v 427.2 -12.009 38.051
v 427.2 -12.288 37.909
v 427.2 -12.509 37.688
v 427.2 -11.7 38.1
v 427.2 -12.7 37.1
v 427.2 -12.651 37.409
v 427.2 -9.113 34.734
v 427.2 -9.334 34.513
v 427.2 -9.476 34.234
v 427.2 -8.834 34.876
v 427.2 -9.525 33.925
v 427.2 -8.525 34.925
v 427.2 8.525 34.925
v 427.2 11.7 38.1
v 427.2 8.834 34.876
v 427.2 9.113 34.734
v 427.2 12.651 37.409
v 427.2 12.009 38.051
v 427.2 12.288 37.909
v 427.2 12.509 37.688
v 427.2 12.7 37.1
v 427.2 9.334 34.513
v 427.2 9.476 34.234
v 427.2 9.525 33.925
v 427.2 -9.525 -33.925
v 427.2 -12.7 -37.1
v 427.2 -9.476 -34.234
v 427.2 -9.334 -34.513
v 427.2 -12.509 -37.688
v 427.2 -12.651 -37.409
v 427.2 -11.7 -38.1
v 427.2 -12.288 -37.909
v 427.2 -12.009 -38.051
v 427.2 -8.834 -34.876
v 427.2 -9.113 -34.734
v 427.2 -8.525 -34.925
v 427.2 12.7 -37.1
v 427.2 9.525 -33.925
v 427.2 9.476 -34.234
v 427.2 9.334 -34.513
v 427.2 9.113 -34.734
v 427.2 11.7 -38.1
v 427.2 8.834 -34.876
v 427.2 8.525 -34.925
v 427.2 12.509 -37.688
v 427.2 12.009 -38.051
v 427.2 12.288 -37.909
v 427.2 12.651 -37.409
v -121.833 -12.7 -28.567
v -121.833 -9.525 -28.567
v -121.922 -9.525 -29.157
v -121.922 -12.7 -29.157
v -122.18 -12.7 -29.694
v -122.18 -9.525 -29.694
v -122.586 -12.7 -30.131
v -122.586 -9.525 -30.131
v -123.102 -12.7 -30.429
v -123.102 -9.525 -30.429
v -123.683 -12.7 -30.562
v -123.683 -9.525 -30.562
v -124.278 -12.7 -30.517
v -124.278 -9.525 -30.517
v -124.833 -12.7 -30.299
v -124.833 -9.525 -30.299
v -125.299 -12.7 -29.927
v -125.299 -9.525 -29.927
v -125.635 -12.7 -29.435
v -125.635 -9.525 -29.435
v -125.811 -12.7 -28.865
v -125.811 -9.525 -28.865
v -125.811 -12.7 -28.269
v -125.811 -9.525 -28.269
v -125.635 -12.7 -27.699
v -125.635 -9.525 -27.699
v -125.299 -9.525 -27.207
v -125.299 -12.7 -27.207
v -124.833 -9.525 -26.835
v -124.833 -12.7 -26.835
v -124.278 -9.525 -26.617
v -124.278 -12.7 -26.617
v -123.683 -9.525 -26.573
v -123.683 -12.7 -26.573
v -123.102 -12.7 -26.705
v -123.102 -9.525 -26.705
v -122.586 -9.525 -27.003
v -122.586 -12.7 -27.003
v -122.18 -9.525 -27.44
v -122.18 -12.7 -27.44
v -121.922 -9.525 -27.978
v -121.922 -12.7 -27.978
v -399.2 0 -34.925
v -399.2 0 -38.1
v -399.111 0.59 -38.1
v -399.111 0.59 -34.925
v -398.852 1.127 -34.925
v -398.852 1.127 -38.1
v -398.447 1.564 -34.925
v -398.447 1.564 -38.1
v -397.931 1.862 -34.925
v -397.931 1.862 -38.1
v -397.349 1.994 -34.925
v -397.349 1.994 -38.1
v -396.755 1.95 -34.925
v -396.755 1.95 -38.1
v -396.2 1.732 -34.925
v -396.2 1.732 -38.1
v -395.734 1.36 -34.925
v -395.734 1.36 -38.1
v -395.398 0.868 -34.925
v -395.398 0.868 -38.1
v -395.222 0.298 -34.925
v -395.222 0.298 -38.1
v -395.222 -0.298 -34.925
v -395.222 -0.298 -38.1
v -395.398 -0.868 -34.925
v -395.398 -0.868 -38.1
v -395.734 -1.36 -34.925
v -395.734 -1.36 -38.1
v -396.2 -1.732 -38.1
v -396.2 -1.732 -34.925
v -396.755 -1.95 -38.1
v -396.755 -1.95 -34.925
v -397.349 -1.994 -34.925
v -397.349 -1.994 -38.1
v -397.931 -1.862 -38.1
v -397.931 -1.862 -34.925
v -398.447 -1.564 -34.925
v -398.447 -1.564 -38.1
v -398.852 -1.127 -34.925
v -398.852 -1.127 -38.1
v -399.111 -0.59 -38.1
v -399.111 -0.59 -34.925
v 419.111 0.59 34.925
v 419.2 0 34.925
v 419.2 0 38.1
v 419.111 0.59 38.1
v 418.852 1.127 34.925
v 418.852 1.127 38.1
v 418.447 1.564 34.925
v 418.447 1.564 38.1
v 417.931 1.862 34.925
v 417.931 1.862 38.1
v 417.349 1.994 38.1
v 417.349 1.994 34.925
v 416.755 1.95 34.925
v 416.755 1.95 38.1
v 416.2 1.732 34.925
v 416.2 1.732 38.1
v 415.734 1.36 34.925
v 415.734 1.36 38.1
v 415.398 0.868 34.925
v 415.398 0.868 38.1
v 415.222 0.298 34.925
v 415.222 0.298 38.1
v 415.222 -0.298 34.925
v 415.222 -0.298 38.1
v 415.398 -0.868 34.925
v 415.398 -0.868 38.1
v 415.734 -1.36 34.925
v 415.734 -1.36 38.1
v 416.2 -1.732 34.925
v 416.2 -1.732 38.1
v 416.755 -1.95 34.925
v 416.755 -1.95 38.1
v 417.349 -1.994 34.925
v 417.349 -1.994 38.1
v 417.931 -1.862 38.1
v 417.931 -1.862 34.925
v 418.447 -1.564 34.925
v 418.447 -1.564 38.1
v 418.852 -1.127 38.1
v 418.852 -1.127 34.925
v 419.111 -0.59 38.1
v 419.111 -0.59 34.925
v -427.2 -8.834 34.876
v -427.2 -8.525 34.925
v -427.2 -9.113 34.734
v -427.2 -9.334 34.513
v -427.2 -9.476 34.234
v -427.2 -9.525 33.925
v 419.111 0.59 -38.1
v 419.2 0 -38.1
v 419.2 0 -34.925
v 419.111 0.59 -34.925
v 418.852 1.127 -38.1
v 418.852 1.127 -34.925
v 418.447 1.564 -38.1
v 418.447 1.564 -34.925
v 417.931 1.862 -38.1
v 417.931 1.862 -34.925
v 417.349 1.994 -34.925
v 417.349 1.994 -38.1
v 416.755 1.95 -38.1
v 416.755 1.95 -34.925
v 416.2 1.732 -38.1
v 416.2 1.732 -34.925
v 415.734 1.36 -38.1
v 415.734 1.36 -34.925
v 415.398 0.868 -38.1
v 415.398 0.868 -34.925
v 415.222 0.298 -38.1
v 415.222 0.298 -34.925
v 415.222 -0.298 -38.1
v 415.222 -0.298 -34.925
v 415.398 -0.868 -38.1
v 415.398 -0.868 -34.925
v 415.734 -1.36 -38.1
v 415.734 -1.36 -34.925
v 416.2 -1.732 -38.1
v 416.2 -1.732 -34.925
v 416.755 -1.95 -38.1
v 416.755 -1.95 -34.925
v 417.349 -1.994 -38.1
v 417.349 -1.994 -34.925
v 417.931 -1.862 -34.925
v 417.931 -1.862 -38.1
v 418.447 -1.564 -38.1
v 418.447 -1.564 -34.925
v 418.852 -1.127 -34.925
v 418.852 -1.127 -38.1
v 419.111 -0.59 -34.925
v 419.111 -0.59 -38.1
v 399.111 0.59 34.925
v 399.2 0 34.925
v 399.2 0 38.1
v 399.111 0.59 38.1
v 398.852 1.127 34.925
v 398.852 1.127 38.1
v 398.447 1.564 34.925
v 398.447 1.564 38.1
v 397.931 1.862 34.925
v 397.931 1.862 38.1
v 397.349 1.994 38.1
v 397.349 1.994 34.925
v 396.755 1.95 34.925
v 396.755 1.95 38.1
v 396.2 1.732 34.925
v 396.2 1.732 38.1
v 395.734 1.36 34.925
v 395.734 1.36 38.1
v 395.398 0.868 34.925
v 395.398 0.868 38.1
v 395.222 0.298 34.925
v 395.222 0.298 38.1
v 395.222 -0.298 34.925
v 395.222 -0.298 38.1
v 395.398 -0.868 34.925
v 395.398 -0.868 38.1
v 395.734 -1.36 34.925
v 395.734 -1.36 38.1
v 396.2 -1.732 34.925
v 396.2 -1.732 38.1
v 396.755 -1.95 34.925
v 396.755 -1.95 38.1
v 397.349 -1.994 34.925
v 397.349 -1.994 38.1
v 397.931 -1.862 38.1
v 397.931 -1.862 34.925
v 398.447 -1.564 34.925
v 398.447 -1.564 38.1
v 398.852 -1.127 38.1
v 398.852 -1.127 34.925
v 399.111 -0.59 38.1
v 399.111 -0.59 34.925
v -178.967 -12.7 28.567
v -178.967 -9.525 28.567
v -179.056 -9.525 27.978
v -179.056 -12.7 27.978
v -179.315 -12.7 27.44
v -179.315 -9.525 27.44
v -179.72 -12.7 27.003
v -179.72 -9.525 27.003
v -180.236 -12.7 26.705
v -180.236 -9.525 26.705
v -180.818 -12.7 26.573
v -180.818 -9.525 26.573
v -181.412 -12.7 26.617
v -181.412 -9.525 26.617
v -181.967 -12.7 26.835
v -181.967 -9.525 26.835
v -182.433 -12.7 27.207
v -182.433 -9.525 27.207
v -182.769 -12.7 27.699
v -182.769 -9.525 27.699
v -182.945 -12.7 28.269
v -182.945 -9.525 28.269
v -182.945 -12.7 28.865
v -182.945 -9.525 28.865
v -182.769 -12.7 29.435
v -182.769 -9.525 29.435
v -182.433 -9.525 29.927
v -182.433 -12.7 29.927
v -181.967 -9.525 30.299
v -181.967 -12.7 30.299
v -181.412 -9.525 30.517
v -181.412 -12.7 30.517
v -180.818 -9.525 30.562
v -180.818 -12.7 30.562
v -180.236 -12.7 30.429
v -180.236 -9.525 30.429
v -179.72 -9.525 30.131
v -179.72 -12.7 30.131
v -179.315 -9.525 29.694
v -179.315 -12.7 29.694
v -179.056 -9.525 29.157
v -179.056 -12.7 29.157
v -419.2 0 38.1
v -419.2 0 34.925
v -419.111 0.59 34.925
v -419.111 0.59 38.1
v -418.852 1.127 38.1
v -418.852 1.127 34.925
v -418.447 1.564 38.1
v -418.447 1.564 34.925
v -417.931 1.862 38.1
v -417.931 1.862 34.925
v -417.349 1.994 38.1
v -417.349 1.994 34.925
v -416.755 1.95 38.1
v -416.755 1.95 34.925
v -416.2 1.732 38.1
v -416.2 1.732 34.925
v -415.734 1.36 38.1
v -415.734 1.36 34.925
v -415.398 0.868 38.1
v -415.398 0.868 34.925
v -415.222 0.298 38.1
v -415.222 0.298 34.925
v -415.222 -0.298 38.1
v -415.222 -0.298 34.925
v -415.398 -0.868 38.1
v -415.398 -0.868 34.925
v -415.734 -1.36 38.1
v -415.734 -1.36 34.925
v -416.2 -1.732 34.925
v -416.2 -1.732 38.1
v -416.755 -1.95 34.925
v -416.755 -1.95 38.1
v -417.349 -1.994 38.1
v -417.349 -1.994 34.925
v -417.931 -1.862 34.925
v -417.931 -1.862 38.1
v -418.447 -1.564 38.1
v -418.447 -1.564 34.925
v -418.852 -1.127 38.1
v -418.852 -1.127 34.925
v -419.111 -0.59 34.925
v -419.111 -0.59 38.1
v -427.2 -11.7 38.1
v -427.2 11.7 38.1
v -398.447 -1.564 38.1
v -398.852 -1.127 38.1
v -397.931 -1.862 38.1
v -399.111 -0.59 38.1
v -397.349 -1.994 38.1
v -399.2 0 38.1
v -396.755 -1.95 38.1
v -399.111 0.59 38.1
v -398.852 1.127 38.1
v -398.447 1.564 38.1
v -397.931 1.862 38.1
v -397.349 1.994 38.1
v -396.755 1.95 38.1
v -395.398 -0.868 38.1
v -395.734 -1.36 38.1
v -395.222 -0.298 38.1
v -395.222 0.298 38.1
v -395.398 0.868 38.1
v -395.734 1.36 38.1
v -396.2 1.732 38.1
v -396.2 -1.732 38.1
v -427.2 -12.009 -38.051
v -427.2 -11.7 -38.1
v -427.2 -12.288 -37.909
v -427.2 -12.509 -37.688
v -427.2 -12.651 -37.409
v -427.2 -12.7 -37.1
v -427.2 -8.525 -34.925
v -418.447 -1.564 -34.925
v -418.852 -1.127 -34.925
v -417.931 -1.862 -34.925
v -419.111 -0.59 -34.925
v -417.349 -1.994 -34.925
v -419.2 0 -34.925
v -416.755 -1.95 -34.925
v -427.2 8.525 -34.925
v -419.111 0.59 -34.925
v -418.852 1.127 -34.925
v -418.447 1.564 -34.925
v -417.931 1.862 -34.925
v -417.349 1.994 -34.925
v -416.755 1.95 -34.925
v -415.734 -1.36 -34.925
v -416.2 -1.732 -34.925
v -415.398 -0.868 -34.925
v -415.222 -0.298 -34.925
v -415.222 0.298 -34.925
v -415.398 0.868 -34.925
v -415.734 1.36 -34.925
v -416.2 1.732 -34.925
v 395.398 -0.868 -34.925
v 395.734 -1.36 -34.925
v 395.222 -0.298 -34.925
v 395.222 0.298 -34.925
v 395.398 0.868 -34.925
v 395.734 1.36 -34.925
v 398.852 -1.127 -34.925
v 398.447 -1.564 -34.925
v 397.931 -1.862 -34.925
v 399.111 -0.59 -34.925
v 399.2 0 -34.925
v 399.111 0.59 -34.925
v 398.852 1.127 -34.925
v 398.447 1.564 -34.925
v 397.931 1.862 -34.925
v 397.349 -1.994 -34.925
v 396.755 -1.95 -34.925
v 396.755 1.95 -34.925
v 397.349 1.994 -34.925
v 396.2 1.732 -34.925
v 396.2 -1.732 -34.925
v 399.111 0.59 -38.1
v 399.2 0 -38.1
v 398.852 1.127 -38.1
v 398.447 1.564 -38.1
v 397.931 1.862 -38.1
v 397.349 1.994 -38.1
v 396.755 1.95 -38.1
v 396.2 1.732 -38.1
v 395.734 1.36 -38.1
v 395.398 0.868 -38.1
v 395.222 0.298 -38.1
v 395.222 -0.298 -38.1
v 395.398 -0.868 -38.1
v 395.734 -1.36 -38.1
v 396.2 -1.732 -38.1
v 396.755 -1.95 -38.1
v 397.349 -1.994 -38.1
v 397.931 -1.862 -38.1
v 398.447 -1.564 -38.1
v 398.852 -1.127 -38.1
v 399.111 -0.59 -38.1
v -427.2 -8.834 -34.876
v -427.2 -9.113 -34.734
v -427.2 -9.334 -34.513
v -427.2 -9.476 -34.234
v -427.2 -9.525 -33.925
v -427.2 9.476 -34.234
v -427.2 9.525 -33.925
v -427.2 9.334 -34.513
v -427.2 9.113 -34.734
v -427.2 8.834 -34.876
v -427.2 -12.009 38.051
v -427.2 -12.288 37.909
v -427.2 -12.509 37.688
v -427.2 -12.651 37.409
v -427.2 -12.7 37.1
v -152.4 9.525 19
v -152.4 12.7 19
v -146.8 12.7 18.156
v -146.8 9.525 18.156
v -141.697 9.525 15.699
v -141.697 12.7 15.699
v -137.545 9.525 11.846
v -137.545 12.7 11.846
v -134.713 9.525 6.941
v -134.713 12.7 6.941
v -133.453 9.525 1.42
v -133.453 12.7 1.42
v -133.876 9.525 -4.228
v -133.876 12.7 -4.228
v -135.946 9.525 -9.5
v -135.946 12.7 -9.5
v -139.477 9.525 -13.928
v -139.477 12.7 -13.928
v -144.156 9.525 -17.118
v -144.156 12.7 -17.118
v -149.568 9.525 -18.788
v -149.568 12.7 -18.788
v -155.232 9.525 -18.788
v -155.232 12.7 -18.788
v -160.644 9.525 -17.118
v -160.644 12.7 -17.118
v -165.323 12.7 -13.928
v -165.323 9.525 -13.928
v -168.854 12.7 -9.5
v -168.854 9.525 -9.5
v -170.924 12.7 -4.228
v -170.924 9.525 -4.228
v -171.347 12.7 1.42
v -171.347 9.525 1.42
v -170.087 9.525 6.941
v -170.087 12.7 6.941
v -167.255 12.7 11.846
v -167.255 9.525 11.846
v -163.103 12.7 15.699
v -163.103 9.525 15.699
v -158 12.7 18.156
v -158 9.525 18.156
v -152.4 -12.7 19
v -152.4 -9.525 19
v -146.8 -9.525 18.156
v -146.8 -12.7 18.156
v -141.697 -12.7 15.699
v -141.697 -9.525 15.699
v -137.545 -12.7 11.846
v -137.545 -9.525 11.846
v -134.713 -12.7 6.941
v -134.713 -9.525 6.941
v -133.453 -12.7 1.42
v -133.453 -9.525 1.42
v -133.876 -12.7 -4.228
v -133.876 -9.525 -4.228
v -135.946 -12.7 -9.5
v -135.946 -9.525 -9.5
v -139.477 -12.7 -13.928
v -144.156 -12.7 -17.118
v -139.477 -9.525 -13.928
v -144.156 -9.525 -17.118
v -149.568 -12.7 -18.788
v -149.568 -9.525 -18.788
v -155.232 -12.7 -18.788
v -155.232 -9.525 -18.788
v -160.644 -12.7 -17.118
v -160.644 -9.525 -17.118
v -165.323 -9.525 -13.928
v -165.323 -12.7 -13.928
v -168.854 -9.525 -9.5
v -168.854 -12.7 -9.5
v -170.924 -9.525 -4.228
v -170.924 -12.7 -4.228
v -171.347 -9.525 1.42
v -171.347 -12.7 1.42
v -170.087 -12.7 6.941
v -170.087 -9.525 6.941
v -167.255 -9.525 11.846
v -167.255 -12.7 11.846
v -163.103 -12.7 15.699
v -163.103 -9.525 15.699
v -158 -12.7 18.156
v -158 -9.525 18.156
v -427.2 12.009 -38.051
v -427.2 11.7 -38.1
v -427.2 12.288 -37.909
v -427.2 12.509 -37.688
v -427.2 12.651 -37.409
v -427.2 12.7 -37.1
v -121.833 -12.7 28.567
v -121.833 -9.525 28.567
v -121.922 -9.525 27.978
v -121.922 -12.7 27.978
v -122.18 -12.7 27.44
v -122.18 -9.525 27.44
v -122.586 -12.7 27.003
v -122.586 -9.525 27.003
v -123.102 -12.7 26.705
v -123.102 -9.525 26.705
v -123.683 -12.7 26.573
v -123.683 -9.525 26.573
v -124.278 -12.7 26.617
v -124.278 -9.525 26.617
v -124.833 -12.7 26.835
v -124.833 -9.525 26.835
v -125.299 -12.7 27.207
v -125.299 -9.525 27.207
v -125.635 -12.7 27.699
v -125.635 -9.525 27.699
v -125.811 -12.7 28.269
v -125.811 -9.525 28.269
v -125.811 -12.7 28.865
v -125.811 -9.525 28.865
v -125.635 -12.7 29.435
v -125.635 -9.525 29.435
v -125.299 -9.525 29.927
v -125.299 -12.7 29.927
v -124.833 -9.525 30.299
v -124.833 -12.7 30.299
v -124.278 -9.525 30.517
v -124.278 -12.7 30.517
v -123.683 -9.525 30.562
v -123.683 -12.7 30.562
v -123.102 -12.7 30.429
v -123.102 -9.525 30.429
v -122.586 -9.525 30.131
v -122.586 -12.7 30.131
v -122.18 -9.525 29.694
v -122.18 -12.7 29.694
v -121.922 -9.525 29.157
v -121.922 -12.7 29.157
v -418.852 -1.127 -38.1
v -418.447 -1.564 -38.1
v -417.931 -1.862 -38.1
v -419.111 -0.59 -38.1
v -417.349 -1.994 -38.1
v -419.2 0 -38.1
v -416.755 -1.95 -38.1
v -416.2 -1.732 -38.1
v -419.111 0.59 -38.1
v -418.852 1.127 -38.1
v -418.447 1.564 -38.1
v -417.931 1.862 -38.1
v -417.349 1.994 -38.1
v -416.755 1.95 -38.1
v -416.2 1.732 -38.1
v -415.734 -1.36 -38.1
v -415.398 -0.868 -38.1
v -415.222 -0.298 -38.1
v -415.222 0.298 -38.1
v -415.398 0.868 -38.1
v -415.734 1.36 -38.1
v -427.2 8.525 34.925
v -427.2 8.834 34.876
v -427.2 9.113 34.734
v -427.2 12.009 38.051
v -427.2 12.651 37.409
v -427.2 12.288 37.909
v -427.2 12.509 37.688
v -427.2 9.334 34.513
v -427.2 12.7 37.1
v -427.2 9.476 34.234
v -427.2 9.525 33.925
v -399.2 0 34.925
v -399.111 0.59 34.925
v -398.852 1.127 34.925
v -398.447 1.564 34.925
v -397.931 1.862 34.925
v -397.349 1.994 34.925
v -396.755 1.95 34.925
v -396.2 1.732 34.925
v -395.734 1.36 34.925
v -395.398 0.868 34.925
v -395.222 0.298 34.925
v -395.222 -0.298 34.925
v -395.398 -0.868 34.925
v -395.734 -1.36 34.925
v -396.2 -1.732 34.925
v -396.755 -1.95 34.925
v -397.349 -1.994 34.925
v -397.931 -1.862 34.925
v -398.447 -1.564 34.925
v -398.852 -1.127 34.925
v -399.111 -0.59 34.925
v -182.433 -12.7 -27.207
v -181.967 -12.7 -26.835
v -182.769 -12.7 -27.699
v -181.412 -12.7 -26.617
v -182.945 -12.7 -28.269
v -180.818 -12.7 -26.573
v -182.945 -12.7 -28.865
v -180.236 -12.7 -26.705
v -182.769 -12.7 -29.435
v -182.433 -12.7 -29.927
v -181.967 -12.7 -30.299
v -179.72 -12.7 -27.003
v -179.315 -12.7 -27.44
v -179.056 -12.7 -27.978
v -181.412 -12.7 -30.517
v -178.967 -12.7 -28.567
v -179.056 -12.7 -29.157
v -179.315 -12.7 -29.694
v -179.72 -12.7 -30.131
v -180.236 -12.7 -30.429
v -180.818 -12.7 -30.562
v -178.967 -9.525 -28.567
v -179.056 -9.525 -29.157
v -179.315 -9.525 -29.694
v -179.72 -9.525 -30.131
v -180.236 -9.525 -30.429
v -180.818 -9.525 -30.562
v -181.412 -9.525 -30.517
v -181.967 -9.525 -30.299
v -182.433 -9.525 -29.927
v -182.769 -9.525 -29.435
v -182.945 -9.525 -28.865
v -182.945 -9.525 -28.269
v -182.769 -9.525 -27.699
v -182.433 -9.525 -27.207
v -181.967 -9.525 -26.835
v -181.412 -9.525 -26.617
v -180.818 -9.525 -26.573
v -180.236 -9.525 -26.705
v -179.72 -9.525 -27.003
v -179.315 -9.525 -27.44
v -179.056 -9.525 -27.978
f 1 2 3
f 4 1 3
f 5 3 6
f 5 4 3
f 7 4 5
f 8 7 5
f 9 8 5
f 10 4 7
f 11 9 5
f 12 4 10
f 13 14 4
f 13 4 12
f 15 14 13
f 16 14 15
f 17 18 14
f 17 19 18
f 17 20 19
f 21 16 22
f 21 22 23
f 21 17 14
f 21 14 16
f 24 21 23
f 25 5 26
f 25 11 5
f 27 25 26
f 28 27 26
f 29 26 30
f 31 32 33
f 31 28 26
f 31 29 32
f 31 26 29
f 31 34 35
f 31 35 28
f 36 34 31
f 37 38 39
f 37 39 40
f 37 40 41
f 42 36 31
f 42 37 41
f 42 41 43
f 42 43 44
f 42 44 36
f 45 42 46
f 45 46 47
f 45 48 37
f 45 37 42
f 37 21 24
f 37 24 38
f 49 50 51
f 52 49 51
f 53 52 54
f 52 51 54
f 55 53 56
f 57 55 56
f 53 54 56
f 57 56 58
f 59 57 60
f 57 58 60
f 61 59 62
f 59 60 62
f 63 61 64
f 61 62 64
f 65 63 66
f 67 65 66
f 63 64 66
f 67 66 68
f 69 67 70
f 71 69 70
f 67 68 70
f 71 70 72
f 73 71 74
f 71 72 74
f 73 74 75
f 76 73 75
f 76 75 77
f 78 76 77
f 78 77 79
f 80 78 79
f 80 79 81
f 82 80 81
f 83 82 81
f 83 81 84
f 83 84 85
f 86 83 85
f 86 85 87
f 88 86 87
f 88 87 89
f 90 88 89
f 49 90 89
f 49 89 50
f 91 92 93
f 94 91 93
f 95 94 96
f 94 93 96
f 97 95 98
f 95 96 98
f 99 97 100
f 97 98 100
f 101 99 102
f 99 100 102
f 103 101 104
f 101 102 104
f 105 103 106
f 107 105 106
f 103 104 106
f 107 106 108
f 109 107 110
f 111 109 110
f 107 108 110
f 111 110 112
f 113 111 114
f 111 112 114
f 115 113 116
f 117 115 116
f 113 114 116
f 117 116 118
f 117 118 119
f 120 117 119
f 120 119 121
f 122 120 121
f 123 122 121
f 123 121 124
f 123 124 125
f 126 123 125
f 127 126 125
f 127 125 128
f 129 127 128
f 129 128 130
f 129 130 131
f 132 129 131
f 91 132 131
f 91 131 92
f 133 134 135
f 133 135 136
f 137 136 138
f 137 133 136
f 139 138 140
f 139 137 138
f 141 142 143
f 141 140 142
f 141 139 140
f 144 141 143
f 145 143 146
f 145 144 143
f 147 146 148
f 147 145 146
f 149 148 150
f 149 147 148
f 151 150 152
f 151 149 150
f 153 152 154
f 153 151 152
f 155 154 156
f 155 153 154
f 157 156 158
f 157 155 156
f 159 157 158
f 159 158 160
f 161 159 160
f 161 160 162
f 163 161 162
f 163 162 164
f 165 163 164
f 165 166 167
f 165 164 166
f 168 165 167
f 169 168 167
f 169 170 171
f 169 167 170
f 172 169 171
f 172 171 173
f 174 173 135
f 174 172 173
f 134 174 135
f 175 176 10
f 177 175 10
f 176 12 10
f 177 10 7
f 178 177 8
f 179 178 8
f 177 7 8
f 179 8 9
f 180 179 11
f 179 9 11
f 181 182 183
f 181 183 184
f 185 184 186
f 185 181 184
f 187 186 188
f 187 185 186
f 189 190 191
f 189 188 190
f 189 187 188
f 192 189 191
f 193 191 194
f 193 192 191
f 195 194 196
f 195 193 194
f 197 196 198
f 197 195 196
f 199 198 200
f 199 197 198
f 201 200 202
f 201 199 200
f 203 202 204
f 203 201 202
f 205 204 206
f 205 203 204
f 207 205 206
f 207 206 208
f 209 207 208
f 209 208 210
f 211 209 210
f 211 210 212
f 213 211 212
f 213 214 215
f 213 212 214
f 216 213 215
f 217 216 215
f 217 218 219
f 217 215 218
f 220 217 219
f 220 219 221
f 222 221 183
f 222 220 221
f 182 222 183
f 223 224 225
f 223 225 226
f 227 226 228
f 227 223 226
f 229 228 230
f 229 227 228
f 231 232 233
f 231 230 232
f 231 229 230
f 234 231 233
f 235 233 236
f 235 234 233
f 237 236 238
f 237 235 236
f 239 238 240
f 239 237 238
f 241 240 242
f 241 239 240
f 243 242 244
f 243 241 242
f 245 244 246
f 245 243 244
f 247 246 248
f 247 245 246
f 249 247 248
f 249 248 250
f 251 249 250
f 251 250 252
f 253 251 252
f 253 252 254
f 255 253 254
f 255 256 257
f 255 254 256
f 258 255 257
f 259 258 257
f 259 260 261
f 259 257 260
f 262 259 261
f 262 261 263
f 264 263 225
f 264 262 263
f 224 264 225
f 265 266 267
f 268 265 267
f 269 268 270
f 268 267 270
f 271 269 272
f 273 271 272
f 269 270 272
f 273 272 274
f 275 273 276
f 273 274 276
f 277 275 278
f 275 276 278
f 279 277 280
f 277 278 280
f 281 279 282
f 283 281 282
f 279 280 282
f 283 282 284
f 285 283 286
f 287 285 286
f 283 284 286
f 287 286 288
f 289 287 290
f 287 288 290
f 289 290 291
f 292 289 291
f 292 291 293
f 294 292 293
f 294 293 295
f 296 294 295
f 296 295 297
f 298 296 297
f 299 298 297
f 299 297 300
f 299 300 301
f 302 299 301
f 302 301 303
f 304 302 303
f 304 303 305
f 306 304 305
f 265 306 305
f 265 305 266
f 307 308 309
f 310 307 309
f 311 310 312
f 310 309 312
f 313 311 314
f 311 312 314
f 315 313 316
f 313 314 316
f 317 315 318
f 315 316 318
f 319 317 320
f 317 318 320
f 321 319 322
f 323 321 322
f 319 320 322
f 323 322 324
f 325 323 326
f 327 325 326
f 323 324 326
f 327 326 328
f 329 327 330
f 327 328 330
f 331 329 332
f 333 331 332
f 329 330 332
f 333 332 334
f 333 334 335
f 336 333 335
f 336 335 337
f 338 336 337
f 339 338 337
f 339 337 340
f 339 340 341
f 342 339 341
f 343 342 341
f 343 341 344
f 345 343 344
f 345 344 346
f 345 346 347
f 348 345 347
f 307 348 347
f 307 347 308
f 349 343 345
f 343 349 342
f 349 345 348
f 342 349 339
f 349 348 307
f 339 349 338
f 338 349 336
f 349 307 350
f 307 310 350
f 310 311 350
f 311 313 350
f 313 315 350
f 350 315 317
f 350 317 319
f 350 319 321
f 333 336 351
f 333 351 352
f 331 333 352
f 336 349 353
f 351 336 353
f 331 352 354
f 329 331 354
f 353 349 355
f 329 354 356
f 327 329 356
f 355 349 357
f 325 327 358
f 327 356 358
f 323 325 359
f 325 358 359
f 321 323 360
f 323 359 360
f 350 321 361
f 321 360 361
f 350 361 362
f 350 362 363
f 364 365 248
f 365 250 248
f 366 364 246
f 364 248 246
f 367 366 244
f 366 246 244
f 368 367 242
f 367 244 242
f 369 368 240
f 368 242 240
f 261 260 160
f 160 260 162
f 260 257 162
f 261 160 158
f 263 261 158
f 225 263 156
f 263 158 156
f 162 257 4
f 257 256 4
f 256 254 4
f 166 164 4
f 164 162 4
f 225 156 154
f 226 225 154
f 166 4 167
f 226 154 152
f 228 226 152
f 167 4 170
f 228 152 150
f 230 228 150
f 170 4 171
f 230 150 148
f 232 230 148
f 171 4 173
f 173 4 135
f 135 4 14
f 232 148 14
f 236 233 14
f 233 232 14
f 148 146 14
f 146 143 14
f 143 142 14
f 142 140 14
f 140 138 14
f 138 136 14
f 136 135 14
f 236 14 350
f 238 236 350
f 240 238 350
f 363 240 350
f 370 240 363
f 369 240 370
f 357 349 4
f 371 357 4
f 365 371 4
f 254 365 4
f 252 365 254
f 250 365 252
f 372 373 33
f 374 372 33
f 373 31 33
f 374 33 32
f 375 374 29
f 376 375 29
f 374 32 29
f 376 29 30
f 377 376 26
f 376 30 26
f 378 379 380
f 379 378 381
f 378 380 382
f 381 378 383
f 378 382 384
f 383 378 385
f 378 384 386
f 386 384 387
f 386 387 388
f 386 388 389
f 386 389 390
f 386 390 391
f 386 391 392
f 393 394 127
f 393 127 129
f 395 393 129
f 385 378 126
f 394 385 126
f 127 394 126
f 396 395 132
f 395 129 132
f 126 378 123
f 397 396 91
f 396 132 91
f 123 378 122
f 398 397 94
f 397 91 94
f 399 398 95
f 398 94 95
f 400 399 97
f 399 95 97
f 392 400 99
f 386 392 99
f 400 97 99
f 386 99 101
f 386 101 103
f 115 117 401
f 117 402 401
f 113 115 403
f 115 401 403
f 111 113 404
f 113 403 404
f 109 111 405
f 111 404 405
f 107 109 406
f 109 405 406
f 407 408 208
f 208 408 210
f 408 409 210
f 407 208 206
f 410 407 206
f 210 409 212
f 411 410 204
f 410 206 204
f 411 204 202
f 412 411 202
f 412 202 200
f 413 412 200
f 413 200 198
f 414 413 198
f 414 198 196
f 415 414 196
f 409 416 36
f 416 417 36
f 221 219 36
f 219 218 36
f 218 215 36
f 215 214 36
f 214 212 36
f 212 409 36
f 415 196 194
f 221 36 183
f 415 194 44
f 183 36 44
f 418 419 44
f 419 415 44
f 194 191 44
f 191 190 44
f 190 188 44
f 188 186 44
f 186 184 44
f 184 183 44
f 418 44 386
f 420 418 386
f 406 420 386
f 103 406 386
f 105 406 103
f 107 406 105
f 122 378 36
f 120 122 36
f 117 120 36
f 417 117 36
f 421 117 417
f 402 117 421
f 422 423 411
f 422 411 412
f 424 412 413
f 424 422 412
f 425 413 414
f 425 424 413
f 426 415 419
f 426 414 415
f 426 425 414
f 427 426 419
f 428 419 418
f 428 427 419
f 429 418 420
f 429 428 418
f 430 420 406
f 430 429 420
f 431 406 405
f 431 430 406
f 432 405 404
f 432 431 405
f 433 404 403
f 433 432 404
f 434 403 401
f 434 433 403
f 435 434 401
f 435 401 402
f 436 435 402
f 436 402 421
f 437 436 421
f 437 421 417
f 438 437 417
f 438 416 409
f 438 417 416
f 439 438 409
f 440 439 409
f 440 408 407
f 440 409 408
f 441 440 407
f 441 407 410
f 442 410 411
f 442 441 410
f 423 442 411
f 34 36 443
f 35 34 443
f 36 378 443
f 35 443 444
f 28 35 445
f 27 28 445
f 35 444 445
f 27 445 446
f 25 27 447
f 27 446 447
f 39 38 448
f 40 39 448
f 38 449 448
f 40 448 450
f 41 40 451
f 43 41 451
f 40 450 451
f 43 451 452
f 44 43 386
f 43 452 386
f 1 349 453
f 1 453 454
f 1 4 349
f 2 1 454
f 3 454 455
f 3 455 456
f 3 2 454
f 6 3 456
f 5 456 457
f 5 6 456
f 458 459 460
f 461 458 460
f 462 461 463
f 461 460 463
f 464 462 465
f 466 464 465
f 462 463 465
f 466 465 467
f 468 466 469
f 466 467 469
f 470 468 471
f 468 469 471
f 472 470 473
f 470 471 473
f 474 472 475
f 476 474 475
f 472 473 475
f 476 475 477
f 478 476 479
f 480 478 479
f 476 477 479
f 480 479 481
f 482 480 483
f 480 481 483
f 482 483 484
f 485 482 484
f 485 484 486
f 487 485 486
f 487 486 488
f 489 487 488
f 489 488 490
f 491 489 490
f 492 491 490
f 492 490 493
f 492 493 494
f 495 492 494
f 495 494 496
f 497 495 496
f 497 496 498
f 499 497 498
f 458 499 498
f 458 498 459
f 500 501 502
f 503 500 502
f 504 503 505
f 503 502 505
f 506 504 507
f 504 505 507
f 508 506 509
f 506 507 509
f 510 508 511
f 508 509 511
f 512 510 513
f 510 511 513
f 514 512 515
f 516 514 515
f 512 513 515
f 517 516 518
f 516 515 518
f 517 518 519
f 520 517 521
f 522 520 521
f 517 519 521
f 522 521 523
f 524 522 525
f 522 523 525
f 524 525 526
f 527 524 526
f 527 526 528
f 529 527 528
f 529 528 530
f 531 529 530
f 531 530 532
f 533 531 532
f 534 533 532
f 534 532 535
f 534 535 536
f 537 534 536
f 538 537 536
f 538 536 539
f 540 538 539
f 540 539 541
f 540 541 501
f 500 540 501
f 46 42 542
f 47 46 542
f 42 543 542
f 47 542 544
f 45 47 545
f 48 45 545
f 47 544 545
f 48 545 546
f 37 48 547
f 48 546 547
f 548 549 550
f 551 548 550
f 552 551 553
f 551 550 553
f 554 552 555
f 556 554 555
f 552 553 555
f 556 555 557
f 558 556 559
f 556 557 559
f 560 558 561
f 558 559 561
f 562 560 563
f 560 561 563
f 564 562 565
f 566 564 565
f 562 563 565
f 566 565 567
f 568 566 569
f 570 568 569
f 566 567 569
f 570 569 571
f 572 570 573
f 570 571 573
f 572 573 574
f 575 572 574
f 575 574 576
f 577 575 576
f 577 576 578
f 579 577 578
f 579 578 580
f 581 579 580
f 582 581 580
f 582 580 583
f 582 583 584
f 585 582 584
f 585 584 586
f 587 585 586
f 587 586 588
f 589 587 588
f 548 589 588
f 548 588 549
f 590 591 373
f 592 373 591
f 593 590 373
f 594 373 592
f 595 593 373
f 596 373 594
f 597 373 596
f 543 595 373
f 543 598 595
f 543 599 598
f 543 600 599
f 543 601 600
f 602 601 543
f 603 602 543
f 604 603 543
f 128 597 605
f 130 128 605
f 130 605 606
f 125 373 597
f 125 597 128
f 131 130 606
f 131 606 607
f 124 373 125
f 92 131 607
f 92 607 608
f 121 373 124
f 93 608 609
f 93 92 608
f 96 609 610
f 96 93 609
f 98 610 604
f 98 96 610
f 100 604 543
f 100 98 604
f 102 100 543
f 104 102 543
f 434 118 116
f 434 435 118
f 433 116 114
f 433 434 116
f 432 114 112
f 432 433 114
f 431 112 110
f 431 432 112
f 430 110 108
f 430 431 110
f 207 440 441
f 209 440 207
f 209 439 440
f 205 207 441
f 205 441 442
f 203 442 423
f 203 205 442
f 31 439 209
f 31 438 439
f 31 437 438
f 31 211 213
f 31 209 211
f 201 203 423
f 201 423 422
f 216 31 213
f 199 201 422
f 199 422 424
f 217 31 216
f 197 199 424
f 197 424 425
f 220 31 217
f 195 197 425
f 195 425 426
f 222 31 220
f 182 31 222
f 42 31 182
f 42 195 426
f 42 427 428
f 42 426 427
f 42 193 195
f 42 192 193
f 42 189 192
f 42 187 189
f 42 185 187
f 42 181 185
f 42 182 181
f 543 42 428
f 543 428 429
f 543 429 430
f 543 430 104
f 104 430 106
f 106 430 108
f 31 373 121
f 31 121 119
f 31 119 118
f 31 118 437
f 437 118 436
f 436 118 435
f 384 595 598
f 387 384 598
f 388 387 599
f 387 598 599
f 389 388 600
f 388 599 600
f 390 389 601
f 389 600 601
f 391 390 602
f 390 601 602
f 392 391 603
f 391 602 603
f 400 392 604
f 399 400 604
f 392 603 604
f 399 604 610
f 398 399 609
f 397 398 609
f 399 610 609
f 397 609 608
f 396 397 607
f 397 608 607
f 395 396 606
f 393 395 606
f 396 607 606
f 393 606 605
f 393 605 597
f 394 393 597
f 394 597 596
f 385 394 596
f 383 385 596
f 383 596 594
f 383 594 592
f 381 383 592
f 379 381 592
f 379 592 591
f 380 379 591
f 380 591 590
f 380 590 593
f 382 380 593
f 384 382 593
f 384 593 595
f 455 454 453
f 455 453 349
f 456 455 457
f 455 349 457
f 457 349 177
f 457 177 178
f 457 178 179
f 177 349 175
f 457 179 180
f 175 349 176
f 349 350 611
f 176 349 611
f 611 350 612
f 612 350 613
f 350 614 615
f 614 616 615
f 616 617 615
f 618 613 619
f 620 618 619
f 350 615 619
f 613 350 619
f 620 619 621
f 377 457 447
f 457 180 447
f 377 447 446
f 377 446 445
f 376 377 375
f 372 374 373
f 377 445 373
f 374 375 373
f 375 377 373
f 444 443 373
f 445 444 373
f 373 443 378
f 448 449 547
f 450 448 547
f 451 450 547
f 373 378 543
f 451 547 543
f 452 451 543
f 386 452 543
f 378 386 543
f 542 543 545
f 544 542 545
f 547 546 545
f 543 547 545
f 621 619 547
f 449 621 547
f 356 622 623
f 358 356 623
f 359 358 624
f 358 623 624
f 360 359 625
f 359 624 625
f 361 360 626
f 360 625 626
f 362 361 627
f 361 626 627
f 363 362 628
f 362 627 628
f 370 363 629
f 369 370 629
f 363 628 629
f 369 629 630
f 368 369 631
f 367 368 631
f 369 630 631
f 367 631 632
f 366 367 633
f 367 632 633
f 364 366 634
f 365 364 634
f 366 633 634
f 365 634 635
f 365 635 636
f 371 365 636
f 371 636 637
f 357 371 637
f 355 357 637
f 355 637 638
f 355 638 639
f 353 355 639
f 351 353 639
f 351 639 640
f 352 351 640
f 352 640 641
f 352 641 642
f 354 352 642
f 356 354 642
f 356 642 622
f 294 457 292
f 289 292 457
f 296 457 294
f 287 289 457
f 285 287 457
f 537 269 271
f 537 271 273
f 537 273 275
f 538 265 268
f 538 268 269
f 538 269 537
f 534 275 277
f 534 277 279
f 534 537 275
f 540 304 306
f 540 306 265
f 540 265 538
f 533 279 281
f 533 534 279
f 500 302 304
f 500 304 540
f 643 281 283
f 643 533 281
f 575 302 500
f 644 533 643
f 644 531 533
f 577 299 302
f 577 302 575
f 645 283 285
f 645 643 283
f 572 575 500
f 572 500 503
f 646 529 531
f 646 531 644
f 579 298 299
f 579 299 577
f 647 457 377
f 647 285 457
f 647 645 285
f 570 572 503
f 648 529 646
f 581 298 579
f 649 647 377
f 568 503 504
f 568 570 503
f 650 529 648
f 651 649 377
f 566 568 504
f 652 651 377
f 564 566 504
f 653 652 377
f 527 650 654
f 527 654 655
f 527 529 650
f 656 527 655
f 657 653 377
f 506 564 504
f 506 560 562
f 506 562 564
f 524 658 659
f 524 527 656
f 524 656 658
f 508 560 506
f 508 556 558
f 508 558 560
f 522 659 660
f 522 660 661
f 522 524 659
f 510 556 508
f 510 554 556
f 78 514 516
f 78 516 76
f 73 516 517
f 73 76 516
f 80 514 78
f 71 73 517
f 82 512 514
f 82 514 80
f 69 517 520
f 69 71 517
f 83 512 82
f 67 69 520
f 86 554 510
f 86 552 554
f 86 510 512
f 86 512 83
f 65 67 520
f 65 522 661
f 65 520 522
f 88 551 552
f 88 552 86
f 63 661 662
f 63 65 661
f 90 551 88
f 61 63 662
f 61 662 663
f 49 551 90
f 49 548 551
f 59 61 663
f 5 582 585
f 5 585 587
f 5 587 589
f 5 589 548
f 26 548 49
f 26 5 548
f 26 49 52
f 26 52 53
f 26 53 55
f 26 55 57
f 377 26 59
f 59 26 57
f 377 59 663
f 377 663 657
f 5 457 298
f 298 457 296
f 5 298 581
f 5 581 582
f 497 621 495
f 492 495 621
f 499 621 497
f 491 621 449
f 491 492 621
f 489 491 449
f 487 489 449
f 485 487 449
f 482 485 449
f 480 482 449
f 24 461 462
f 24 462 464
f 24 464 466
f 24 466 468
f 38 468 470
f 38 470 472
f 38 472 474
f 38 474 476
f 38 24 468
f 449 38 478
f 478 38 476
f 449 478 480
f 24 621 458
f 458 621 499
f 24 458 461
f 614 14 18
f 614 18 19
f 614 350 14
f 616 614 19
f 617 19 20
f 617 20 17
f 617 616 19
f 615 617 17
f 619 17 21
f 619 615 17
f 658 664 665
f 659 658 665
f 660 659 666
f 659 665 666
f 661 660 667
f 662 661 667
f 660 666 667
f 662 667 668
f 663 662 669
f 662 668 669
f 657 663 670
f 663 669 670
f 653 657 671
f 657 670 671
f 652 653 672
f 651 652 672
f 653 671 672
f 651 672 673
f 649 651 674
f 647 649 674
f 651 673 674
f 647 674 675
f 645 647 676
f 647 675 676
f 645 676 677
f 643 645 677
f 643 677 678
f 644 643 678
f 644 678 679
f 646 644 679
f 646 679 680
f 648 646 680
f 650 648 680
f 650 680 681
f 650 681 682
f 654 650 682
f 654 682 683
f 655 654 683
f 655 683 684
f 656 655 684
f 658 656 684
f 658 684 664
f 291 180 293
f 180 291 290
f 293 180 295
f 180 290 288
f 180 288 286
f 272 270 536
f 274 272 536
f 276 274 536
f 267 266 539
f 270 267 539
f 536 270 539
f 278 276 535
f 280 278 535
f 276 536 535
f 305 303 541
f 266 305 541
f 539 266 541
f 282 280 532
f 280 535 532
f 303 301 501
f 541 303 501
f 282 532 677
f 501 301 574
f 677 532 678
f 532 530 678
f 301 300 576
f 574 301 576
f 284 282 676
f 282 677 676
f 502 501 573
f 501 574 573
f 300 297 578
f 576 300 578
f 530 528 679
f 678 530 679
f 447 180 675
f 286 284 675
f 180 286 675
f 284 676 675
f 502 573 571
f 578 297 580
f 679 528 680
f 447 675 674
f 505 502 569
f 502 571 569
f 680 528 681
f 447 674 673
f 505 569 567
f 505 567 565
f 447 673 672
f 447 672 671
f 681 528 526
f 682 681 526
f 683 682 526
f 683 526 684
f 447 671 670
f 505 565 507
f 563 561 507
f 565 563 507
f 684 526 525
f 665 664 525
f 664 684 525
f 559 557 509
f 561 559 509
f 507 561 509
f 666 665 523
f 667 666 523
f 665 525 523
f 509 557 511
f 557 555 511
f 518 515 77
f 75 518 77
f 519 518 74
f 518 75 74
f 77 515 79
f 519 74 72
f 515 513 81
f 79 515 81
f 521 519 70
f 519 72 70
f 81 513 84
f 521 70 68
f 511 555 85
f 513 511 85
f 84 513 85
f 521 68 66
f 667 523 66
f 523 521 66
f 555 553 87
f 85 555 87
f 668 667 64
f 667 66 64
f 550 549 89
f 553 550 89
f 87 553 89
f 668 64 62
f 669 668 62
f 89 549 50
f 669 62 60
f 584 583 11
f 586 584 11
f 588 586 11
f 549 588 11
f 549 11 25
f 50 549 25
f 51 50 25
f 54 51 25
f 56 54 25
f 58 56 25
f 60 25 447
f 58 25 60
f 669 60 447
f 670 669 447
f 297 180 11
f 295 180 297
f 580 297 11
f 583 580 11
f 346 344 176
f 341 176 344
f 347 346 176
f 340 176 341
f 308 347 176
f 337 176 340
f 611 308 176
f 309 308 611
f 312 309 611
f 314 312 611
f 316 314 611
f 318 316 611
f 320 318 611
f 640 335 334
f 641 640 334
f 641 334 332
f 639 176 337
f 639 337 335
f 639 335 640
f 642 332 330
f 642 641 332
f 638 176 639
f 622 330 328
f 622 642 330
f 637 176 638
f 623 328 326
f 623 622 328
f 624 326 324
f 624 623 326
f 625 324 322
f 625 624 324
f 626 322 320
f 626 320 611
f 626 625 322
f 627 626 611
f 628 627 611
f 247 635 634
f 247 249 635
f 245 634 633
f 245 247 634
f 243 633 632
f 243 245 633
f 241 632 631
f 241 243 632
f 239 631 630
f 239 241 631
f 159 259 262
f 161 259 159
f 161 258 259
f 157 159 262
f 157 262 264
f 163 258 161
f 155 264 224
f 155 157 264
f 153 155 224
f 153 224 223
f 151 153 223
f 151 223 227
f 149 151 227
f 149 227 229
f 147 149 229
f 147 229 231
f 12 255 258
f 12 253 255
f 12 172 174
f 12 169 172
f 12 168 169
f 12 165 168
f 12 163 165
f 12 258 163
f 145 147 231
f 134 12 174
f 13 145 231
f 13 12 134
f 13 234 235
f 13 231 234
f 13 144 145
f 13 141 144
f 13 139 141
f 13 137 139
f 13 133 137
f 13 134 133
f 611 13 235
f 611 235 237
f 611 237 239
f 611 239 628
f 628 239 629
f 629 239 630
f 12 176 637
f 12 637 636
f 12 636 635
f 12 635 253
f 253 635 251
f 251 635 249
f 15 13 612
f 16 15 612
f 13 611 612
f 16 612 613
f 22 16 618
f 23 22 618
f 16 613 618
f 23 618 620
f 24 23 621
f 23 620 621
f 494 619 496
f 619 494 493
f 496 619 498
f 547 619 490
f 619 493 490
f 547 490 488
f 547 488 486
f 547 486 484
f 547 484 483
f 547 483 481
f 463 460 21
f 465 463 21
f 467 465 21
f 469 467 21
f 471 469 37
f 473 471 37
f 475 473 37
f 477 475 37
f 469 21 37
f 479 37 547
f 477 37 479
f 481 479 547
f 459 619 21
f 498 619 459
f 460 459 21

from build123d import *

# Parameters (mm, degrees)
SKETCH1_W                 = 76.2
SKETCH1_H                 = 25.4
SKETCH1_W_2               = 69.85
SKETCH1_H_2               = 19.05
BOSS_EXTRUDE1_DEPTH       = 427.2
FILLET1_R                 = 1
SKETCH2_R                 = 19
CUT_EXTRUDE1_DEPTH        = 430.647076099
F_4_0MM_DOWEL_HOLE1_D     = 4
F_4_0MM_DOWEL_HOLE2_D     = 4
F_4_0MM_DOWEL_HOLE2_DEPTH = 3.175


with BuildPart() as part:
    # Sketch1 → Boss-Extrude1 (new, symmetric)
    with BuildSketch(Plane(origin=(0, 0, 0), x_dir=(0, 0, -1), z_dir=(1, 0, 0))):
        Rectangle(SKETCH1_W, SKETCH1_H)
        Rectangle(SKETCH1_W_2, SKETCH1_H_2, mode=Mode.SUBTRACT)
    extrude(amount=BOSS_EXTRUDE1_DEPTH, both=True)

    # Fillet1
    fillet1_edges = [part.edges().sort_by_distance(p)[0] for p in [
        (0, 9.525, 34.925),
        (0, -9.525, 34.925),
        (0, -9.525, -34.925),
        (0, 9.525, -34.925),
        (0, 12.7, 38.1),
        (0, 12.7, -38.1),
        (0, -12.7, -38.1),
        (0, -12.7, 38.1),
    ]]
    fillet(fillet1_edges, radius=FILLET1_R)

    # Sketch2 → Cut-Extrude1 (cut, through all)
    with BuildSketch(Plane(origin=(0, 12.7, 0), x_dir=(1, 0, 0), z_dir=(0, 1, 0))):
        with Locations(Location((-152.4, 0, 0), (0, 0, 270))):
            Circle(SKETCH2_R)
    extrude(amount=-CUT_EXTRUDE1_DEPTH, mode=Mode.SUBTRACT)

    # Ø4.0mm Dowel Hole1 (through all)
    with Locations(Plane.XY.offset(38.1)):
        with Locations((-417.2, 0), (-397.2, 0)):
            f_4_0mm_dowel_hole1 = Hole(F_4_0MM_DOWEL_HOLE1_D / 2)

    # Mirror1: Ø4.0mm Dowel Hole1 across plane
    add(f_4_0mm_dowel_hole1.mirror(Plane(origin=(0, 0, 0), x_dir=(0, 0, 1), z_dir=(1, 0, 0))), mode=Mode.SUBTRACT)

    # Ø4.0mm Dowel Hole2
    with Locations(Plane(origin=(0, -12.7, 0), x_dir=(-1, 0, 0), z_dir=(0, -1, 0))):
        with Locations((180.96711396, -28.56711396), (180.96711396, 28.56711396), (123.83288604, 28.56711396), (123.83288604, -28.56711396)):
            Hole(F_4_0MM_DOWEL_HOLE2_D / 2, depth=F_4_0MM_DOWEL_HOLE2_DEPTH)


solid = part.part
